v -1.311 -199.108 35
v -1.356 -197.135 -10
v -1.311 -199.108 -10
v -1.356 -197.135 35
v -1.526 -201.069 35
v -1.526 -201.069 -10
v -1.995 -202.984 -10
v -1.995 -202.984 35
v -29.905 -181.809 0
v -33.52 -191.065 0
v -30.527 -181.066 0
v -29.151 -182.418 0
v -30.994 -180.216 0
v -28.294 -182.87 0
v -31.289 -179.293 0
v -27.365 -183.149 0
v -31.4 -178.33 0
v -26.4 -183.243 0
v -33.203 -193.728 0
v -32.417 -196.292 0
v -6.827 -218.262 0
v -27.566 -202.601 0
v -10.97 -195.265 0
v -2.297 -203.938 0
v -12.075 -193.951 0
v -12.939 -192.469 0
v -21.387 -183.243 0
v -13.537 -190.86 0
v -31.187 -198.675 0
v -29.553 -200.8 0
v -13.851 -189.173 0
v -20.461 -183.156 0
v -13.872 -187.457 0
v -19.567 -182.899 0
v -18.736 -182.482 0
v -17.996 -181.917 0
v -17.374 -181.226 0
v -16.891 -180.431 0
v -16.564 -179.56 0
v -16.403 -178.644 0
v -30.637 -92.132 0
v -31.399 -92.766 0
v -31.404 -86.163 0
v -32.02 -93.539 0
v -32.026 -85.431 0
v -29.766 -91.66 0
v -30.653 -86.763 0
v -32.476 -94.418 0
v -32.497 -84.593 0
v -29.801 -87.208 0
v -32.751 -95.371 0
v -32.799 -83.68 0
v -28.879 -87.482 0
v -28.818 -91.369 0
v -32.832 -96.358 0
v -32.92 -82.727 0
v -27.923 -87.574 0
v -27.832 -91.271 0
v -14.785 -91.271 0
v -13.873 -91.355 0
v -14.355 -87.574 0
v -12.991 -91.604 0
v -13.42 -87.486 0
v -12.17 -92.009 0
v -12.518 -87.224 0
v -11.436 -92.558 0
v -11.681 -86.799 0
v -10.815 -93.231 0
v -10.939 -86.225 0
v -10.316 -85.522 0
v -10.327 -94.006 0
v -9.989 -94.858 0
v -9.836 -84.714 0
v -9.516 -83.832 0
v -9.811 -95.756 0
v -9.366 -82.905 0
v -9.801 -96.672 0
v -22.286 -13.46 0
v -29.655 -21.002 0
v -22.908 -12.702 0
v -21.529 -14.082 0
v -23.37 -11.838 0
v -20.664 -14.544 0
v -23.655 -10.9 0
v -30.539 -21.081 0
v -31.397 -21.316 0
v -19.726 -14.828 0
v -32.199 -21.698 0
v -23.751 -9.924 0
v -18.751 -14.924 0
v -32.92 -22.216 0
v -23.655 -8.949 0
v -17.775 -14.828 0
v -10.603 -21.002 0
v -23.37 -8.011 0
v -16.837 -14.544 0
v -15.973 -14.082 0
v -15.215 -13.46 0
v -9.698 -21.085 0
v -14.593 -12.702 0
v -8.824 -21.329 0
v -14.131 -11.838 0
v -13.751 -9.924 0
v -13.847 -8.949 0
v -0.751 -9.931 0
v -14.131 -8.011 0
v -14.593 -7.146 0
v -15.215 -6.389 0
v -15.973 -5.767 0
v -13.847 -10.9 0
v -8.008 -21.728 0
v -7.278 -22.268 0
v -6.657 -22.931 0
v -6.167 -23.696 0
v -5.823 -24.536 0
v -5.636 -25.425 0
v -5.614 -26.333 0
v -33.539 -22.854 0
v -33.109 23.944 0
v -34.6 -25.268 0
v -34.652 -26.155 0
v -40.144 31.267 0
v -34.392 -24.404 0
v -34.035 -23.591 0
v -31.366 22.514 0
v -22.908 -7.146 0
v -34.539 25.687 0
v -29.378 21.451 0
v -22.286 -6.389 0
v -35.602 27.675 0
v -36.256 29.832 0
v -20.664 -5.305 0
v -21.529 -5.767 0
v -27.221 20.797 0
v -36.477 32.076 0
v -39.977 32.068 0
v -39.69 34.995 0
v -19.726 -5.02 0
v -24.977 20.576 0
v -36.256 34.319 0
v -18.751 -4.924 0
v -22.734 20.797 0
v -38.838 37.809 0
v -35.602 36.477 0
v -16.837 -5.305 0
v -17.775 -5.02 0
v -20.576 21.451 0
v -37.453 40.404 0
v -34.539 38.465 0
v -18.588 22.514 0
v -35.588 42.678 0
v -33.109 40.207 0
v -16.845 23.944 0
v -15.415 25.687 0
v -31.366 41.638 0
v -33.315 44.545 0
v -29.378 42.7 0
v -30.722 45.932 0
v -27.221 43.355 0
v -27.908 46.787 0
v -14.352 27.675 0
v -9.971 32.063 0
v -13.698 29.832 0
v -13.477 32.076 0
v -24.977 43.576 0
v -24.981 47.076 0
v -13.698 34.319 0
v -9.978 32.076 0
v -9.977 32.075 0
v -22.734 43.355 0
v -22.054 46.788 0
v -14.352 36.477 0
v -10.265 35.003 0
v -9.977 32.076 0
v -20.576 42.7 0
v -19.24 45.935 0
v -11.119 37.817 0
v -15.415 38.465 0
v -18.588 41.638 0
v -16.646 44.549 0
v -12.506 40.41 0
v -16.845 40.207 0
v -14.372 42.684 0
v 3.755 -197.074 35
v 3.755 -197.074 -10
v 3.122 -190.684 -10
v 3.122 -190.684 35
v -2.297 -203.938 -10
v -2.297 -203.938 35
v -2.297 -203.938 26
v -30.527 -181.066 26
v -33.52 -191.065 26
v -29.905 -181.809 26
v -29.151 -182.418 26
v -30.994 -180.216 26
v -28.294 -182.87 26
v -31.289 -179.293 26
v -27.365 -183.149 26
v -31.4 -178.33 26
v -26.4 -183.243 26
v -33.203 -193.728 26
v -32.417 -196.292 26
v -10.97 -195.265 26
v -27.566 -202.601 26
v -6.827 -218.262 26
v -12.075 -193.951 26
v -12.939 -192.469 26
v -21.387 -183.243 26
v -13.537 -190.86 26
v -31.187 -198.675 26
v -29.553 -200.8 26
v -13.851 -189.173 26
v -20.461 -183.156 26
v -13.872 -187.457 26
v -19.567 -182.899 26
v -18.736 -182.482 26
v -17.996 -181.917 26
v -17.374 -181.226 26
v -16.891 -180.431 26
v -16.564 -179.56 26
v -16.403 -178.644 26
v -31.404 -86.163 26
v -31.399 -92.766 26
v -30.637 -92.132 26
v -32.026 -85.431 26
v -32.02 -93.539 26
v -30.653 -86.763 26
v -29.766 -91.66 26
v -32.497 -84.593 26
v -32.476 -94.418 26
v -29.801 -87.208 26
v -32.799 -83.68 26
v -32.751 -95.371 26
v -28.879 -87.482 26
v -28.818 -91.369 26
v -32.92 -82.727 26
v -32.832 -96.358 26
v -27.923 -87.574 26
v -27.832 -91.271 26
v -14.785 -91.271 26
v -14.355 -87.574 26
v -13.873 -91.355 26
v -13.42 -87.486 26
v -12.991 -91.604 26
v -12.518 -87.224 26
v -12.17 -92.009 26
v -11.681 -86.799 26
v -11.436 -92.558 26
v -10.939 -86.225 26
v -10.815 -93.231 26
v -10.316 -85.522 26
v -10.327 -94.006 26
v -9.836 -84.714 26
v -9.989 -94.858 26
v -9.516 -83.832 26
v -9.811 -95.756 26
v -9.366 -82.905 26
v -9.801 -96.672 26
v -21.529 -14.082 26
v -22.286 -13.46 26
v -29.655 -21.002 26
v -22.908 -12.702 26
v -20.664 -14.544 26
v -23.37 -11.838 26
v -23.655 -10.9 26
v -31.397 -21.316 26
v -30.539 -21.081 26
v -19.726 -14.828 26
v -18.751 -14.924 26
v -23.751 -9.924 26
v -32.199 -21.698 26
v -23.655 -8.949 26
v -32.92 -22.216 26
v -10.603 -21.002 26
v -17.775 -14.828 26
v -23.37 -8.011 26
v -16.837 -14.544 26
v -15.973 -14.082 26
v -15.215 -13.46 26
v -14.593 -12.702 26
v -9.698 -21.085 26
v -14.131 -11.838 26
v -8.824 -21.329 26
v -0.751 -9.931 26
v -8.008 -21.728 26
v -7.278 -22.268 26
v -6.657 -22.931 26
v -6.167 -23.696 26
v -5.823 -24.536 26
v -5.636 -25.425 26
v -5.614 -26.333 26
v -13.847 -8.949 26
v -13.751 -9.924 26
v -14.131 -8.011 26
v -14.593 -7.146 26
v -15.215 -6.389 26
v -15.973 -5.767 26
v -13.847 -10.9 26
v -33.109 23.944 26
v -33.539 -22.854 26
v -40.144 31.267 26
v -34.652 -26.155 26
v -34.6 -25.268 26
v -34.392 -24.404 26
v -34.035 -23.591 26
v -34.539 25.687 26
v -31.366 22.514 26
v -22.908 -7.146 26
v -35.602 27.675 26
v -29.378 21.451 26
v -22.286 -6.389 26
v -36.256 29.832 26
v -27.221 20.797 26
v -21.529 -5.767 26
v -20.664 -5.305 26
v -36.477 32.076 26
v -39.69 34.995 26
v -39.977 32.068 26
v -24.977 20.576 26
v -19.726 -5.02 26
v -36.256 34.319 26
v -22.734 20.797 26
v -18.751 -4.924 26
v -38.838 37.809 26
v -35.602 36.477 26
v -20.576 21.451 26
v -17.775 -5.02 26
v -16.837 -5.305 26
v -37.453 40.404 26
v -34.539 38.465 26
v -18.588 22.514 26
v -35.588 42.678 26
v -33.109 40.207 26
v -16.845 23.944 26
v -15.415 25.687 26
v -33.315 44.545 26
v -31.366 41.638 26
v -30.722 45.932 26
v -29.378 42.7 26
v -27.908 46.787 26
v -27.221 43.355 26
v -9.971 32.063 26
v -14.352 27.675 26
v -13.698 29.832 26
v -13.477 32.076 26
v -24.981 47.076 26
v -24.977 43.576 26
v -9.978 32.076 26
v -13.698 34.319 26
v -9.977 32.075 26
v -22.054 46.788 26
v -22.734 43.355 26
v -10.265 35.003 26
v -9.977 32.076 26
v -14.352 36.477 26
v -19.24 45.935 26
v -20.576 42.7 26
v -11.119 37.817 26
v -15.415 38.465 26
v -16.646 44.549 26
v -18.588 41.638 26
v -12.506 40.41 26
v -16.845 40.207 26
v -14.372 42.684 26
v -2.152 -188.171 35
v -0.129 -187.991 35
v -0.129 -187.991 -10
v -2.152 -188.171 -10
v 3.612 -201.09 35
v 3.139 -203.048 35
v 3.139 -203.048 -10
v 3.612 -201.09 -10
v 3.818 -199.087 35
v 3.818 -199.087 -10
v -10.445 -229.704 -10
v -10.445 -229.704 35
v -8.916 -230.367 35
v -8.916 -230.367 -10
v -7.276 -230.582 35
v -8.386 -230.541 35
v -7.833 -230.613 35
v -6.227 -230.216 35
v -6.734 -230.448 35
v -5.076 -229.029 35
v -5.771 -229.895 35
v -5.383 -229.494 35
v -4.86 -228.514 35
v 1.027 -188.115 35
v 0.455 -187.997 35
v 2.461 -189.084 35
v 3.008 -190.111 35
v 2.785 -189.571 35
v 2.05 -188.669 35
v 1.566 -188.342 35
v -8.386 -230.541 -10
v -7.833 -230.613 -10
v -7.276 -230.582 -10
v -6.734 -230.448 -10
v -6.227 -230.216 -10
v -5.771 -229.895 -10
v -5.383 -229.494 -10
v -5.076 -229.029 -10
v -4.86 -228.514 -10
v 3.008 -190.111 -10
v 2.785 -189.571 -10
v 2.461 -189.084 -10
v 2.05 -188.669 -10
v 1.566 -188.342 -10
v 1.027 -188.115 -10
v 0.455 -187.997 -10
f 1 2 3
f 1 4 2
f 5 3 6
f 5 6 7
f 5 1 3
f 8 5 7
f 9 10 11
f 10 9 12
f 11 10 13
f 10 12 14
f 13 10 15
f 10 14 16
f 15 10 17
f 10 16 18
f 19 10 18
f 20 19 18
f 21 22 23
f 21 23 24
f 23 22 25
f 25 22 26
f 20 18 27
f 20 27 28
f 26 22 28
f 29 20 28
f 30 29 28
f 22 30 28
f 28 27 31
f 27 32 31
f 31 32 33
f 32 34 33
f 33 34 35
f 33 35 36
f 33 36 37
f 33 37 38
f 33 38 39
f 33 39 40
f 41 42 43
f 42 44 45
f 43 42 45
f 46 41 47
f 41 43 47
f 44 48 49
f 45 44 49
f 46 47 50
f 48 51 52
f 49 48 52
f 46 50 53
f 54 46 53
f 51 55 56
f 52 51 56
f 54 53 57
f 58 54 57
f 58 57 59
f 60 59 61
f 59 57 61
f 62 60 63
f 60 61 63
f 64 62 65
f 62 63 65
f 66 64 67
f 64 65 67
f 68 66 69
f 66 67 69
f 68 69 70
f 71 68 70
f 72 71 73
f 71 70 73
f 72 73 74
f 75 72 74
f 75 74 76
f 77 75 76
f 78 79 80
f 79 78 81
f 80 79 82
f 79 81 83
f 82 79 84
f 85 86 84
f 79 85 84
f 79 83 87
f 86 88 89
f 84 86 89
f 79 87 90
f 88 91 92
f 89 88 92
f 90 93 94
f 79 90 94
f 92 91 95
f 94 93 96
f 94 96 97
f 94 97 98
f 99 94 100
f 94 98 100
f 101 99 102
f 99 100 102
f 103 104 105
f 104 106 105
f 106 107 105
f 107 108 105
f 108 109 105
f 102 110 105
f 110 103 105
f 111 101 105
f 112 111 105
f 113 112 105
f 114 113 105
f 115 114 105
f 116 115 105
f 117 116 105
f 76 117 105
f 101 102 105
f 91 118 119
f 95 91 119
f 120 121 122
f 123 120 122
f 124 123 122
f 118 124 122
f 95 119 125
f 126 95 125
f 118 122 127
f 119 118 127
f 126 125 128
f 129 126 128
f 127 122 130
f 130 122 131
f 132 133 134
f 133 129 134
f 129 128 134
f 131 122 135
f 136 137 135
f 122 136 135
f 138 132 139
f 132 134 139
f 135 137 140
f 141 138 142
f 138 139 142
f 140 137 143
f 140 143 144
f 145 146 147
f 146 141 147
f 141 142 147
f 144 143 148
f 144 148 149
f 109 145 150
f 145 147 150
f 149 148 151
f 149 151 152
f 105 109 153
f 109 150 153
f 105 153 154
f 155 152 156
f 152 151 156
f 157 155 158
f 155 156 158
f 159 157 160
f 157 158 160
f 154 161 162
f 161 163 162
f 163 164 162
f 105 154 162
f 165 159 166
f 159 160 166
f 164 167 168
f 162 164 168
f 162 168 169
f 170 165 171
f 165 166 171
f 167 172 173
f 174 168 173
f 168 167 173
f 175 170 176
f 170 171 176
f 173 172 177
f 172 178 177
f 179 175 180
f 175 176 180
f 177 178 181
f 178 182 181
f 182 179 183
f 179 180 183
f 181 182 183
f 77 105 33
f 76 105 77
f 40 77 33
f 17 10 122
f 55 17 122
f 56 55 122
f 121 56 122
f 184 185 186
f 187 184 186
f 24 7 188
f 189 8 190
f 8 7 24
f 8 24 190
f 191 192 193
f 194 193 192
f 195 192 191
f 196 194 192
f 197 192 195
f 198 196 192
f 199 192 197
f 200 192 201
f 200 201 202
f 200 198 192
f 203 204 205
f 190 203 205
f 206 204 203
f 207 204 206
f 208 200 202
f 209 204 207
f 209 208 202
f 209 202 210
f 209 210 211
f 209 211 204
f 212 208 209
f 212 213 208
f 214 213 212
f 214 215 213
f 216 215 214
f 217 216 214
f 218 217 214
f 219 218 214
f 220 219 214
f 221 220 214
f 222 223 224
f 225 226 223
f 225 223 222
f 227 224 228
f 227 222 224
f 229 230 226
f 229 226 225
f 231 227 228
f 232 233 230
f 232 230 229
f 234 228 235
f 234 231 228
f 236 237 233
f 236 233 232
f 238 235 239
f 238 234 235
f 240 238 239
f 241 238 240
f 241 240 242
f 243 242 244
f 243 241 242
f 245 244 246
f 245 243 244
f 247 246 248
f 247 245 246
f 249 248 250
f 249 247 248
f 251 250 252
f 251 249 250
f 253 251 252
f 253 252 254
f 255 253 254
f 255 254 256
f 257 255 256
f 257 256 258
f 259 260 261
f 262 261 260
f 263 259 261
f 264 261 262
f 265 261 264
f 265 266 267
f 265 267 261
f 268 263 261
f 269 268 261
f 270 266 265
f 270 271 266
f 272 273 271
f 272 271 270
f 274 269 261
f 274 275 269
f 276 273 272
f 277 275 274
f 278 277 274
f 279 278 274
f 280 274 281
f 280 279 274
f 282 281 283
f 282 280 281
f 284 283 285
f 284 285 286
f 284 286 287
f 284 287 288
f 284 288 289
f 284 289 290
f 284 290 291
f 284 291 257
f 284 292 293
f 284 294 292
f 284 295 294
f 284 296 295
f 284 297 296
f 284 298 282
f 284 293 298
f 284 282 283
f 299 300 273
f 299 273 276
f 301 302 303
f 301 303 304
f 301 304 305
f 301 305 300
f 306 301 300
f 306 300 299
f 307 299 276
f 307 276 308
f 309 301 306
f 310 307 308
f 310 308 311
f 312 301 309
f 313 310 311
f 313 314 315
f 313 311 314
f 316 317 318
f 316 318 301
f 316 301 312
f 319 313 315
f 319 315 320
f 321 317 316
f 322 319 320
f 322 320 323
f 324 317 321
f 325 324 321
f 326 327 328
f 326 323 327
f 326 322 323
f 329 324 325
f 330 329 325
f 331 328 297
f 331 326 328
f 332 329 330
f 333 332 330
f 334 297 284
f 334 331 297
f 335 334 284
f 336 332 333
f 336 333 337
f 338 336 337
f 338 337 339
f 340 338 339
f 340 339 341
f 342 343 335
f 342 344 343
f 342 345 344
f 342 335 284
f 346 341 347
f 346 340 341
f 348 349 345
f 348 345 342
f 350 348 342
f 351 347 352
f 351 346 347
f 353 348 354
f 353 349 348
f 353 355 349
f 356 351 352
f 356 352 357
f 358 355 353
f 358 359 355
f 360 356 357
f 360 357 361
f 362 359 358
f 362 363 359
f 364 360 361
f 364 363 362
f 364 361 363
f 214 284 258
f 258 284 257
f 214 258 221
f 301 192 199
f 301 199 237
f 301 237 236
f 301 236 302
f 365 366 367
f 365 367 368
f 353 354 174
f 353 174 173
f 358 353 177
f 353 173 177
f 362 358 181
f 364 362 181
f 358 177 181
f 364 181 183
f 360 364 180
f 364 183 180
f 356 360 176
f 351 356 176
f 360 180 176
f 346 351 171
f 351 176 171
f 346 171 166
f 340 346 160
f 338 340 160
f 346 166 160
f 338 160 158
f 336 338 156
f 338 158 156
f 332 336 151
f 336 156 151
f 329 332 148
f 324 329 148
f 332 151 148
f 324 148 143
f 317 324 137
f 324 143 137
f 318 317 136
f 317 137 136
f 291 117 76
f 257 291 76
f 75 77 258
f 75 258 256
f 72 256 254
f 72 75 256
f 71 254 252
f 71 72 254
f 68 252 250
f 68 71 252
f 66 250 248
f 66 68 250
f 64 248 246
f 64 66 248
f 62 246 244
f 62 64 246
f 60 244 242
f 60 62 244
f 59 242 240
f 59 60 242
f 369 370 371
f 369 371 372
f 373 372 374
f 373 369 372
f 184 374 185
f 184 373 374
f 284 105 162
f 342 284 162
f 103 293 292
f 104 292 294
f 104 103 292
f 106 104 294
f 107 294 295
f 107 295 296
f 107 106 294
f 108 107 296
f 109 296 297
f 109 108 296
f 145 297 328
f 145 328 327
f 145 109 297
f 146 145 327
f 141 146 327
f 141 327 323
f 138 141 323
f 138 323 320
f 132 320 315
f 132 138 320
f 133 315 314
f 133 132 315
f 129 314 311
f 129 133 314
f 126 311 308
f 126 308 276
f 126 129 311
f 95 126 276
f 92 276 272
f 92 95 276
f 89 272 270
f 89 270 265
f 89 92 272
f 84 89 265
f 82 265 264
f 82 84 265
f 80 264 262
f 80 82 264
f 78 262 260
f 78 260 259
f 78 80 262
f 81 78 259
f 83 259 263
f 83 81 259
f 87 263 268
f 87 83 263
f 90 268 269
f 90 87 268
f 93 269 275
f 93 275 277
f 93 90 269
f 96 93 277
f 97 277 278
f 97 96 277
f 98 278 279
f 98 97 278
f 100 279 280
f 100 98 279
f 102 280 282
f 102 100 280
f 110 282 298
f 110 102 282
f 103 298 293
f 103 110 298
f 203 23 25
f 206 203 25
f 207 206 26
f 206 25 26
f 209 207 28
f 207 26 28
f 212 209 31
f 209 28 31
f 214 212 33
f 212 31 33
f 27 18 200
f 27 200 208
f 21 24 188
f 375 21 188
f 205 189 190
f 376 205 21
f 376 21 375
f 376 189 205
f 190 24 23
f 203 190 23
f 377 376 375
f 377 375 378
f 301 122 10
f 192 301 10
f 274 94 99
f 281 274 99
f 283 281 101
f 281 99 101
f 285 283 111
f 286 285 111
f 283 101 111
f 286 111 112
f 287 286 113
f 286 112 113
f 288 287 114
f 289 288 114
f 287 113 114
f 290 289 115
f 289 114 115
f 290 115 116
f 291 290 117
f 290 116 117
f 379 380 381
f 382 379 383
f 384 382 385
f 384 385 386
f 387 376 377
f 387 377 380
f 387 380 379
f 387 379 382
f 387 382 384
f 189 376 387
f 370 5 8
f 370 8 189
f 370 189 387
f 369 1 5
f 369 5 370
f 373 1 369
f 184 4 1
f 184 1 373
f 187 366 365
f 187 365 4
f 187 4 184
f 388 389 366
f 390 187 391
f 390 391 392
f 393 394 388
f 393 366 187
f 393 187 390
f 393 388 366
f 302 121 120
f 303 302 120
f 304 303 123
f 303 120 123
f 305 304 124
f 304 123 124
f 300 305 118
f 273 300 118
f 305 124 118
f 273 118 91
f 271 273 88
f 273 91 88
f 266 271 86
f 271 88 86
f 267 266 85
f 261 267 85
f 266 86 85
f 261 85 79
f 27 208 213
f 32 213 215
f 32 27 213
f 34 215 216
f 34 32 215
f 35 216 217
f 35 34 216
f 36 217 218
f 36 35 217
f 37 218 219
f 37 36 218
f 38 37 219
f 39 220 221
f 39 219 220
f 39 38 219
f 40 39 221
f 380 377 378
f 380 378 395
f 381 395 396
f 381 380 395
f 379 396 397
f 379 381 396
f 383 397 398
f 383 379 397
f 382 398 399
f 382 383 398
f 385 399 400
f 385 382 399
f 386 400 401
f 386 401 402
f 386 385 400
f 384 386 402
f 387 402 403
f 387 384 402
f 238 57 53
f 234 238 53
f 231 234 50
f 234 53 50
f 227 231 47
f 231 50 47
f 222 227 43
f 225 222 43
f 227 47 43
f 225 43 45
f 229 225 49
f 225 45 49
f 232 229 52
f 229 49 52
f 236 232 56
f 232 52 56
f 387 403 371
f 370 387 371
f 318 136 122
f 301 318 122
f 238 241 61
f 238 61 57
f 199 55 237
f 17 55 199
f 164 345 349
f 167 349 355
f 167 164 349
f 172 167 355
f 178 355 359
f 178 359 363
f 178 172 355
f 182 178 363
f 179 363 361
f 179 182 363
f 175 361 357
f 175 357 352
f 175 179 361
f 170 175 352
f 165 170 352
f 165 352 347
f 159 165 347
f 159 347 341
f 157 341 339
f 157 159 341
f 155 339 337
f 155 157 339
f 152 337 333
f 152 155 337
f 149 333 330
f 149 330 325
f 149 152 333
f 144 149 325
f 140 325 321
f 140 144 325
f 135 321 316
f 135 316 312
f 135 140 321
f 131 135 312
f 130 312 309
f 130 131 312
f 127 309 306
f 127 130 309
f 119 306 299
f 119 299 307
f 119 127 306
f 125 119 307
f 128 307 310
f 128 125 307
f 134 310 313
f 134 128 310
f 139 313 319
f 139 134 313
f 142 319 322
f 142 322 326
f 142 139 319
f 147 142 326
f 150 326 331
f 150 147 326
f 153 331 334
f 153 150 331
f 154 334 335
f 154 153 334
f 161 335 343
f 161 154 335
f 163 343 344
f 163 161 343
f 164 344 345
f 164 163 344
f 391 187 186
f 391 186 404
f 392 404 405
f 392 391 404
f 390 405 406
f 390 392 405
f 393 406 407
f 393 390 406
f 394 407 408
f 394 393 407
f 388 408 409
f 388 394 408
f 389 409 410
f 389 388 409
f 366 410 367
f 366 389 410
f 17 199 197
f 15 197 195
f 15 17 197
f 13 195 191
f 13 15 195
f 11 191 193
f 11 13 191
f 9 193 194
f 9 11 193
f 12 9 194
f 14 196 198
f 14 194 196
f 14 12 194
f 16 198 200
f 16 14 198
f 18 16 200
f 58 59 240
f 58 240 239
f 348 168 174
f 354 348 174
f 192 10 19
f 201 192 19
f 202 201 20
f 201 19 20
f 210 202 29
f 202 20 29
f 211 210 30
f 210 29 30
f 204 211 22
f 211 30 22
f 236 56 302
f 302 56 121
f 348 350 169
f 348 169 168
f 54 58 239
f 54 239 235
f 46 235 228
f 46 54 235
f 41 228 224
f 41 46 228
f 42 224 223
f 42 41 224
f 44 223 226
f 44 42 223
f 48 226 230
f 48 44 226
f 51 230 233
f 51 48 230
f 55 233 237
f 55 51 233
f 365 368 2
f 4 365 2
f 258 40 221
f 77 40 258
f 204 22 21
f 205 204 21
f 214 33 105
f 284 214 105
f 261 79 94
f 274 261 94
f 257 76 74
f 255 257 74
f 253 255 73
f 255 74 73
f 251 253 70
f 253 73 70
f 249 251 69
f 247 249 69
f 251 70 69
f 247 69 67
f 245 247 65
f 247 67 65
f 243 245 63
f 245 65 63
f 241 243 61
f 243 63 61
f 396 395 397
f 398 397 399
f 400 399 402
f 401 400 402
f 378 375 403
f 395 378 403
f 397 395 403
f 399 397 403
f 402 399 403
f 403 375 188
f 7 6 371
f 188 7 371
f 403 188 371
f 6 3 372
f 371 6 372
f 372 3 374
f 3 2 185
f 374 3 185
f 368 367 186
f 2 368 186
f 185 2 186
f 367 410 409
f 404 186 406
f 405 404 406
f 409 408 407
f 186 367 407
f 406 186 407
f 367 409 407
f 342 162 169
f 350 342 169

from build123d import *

# Parameters (mm, degrees)
SKETCH1_R                = 5
BOSS_EXTRUDE2_DEPTH      = 26
SKETCH9_R                = 11.5
CUT_EXTRUDE7_DEPTH       = 26
CUT_EXTRUDE8_DEPTH       = 57
BOSS_EXTRUDE5_DEPTH      = 35
BOSS_EXTRUDE5_DEPTH_BACK = 10


with BuildPart() as part:
    # Sketch1 → Boss-Extrude2 (new body)
    with BuildSketch(Plane.XY):
        with BuildLine():
            Line((-13.871543988, -187.456565175), (-0.750718318, -9.931237526))
            Line((-0.750718318, -9.931237526), (-9.971378105, 32.063387678))
            Line((-9.971378105, 32.063387678), (-9.97665526, 32.075234554))
            Line((-9.97665526, 32.075234554), (-9.977087782, 32.075348974))
            Line((-9.977087782, 32.075348974), (-9.978230603, 32.075651298))
            Line((-9.978230603, 32.075651298), (-9.977087779, 32.075655544))
            ThreePointArc((-9.977087779, 32.075655544), (-24.981119404, 47.075655002), (-39.977085612, 32.067592296))
            Line((-39.977085612, 32.067592296), (-40.143970803, 31.267359869))
            Line((-40.143970803, 31.267359869), (-33.520138903, -191.065133081))
            ThreePointArc((-33.520138903, -191.065133081), (-31.855635546, -197.51068285), (-27.565830072, -202.601188939))
            Line((-27.565830072, -202.601188939), (-6.826859709, -218.262215052))
            Line((-6.826859709, -218.262215052), (-2.296825809, -203.937706242))
            Line((-2.296825809, -203.937706242), (-10.96981355, -195.264718501))
            ThreePointArc((-10.96981355, -195.264718501), (-13.272387355, -191.677160819), (-13.871543988, -187.456565175))
        make_face()
        with Locations((-18.750718318, -9.924344456)):
            Circle(SKETCH1_R, mode=Mode.SUBTRACT)
    extrude(amount=BOSS_EXTRUDE2_DEPTH)

    # Sketch9 → Cut-Extrude7 (cut)
    with BuildSketch(Plane.XY):
        with Locations((-24.977087779, 32.075655544)):
            Circle(SKETCH9_R)
    extrude(amount=CUT_EXTRUDE7_DEPTH, mode=Mode.SUBTRACT)

    # Sketch10 → Cut-Extrude8 (cut)
    with BuildSketch(Plane.XY):
        with BuildLine():
            Line((-29.654511548, -21.002260091), (-10.602832717, -21.002260091))
            ThreePointArc((-10.602832717, -21.002260091), (-6.952180176, -22.585721488), (-5.613794584, -26.333165681))
            Line((-5.613794584, -26.333165681), (-9.366001824, -82.90490561))
            ThreePointArc((-9.366001824, -82.90490561), (-10.938501354, -86.224652561), (-14.355039957, -87.574000019))
            Line((-14.355039957, -87.574000019), (-27.922723591, -87.574000019))
            ThreePointArc((-27.922723591, -87.574000019), (-31.403747307, -86.163216354), (-32.920382463, -82.726989577))
            Line((-32.920382463, -82.726989577), (-34.65217042, -26.155249648))
            ThreePointArc((-34.65217042, -26.155249648), (-33.243727882, -22.521236375), (-29.654511548, -21.002260091))
        make_face()
        with BuildLine():
            Line((-14.784895538, -91.270958439), (-27.832276958, -91.270958439))
            ThreePointArc((-27.832276958, -91.270958439), (-31.398552804, -92.766436134), (-32.831514258, -96.358287804))
            Line((-32.831514258, -96.358287804), (-31.399590979, -178.329847134))
            ThreePointArc((-31.399590979, -178.329847134), (-29.904875984, -181.808793615), (-26.400353679, -183.242517768))
            Line((-26.400353679, -183.242517768), (-21.386933453, -183.242517768))
            ThreePointArc((-21.386933453, -183.242517768), (-17.996285711, -181.917229715), (-16.403071948, -178.643920925))
            Line((-16.403071948, -178.643920925), (-9.801034032, -96.672361595))
            ThreePointArc((-9.801034032, -96.672361595), (-11.110183591, -92.880310697), (-14.784895538, -91.270958439))
        make_face()
    extrude(amount=CUT_EXTRUDE8_DEPTH, mode=Mode.SUBTRACT)

    # Sketch11 → Boss-Extrude5 (add, two sides)
    with BuildSketch(Plane.XY) as boss_extrude5_sk:
        with BuildLine():
            Line((-2.296825809, -203.937706242), (-6.826859709, -218.262215052))
            Line((-6.826859709, -218.262215052), (-10.445160296, -229.703714118))
            Line((-10.445160296, -229.703714118), (-8.916301823, -230.367275492))
            ThreePointArc((-8.916301823, -230.367275492), (-6.475373676, -230.344079521), (-4.859724836, -228.514230593))
            Line((-4.859724836, -228.514230593), (3.138639896, -203.047724737))
            ThreePointArc((3.138639896, -203.047724737), (3.748708228, -200.0920804), (3.754779808, -197.074137401))
            Line((3.754779808, -197.074137401), (3.121631235, -190.683812553))
            ThreePointArc((3.121631235, -190.683812553), (2.049929764, -188.669228662), (-0.128962116, -187.991347795))
            Line((-0.128962116, -187.991347795), (-2.151569065, -188.170856397))
            Line((-2.151569065, -188.170856397), (-1.355950129, -197.135465185))
            ThreePointArc((-1.355950129, -197.135465185), (-1.386055005, -200.091588206), (-1.995347326, -202.984395233))
            Line((-1.995347326, -202.984395233), (-2.296825809, -203.937706242))
        make_face()
    extrude(amount=BOSS_EXTRUDE5_DEPTH)
    extrude(boss_extrude5_sk.sketch, amount=-BOSS_EXTRUDE5_DEPTH_BACK)


solid = part.part
